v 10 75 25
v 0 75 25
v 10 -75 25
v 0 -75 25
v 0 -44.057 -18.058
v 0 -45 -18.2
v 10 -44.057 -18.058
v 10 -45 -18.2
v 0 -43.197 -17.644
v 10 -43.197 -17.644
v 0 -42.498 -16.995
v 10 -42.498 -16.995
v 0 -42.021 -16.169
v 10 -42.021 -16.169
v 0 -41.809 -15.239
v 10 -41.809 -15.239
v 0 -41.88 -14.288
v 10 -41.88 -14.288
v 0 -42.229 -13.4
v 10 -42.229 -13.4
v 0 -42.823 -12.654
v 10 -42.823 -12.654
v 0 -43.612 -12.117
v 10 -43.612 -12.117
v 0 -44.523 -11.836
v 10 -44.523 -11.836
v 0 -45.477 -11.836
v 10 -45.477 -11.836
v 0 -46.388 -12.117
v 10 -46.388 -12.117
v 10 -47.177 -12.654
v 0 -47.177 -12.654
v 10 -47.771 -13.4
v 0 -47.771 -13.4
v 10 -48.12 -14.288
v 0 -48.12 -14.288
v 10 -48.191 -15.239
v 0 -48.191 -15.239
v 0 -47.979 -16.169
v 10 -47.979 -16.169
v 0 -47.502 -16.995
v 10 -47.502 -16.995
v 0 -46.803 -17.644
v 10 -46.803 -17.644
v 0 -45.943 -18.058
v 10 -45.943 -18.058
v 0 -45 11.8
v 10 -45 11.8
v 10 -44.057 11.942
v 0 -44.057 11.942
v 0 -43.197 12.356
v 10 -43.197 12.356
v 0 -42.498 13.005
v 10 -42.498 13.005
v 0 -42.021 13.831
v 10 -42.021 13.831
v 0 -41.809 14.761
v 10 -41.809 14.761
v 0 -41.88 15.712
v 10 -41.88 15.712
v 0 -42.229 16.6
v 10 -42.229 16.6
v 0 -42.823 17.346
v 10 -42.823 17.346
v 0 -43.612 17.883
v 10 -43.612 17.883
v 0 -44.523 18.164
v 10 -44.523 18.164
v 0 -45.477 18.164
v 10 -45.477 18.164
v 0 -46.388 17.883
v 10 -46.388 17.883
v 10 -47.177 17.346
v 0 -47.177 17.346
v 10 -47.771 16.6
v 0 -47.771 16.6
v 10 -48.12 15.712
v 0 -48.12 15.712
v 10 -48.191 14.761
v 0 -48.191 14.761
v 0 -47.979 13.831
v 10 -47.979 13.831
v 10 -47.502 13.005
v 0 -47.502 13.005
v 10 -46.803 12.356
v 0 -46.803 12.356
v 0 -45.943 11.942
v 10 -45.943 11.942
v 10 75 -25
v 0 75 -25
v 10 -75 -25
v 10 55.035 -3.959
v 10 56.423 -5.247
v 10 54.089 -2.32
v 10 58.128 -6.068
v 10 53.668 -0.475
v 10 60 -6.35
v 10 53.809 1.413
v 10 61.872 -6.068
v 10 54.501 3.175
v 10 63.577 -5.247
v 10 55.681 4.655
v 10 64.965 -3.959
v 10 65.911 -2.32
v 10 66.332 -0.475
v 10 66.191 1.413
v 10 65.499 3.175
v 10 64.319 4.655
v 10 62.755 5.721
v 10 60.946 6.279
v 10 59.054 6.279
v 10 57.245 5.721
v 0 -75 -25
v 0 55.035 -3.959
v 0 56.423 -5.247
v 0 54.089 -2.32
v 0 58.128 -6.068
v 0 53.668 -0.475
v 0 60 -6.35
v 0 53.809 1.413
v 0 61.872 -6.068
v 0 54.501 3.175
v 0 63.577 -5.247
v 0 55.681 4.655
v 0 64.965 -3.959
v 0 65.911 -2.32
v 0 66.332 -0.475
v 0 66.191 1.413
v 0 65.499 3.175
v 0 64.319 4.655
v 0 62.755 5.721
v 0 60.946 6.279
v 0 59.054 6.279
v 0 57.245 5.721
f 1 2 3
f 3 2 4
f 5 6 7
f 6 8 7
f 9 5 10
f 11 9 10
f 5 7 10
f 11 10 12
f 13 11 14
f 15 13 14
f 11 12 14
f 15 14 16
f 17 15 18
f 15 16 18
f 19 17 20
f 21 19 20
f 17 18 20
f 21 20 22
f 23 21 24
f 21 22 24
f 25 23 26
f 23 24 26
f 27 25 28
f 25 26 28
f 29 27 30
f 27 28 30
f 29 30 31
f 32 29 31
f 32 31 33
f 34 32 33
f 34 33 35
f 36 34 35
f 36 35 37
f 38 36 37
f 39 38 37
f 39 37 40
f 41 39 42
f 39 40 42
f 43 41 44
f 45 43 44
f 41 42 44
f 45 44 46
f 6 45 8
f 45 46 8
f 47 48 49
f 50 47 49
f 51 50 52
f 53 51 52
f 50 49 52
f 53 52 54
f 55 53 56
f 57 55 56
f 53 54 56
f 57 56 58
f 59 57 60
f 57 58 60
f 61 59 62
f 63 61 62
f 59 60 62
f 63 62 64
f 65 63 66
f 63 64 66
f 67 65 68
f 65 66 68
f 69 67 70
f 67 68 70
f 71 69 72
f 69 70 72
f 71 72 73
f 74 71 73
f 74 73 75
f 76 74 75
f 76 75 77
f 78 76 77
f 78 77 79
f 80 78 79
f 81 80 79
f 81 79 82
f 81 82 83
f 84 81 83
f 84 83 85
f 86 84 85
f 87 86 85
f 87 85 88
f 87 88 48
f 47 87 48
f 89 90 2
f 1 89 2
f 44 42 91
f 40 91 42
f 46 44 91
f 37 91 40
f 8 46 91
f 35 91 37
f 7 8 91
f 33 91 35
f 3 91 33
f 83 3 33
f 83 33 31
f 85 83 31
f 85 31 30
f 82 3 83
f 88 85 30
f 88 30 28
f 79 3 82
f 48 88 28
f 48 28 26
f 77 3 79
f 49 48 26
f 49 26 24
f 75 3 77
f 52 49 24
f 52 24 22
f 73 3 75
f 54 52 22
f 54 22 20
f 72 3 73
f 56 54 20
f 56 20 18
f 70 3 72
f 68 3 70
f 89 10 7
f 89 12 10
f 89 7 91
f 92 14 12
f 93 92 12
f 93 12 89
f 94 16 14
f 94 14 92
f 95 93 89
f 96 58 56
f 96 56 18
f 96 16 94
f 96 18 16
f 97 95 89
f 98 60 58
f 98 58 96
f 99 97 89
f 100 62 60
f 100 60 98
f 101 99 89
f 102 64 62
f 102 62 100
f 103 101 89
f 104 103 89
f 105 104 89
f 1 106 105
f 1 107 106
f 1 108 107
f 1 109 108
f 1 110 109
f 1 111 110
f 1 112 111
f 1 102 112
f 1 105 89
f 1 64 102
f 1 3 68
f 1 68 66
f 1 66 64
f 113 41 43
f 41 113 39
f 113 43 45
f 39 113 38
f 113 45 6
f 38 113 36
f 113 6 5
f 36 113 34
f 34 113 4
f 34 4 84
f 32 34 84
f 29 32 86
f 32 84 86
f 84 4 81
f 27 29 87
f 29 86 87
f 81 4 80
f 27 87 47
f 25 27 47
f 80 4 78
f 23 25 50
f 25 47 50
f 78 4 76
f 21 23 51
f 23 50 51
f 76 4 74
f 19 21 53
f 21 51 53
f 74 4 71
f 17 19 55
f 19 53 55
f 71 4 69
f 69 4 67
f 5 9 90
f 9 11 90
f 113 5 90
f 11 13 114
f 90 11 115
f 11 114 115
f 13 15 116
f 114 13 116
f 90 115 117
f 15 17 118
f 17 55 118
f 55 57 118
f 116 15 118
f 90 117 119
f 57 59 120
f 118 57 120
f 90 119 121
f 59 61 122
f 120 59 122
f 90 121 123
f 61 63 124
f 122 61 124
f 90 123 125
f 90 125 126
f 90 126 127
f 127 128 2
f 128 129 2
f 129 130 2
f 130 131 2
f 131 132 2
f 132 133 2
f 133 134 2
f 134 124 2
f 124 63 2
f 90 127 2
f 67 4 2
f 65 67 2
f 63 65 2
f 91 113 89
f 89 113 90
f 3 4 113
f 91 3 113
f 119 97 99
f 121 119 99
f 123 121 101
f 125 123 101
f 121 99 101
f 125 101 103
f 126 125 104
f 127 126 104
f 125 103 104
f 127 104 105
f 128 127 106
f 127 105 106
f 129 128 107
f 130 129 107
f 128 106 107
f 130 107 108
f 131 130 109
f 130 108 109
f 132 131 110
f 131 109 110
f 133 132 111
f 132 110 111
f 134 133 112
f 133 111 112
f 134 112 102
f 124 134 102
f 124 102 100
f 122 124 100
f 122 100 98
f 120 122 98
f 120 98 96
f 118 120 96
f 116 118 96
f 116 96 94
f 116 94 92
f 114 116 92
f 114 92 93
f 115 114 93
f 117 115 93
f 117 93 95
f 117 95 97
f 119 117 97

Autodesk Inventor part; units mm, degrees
ref_plane "YZ Plane" through (0, 0, 0) normal (1, 0, 0) x (0, 1, 0)
ref_plane "XZ Plane" through (0, 0, 0) normal (0, 1, 0) x (-1, 0, 0)
ref_plane "XY Plane" through (0, 0, 0) normal (0, 0, 1) x (1, 0, 0)
sketch "Sketch2" plane through (0, 0, 0) normal (1, 0, 0) x (0, 1, 0)
  line L0 (75, 25) -> (-75, 25)
  line L1 (-75, 25) -> (-75, -25)
  line L2 (-75, -25) -> (75, -25)
  line L3 (75, -25) -> (75, 25)
  line L4 (75, 25) -> (-75, -25) construction
  line L5 (-75, 25) -> (75, -25) construction
  point P0 (0, 0)
  dimension "d4" = 150
  dimension "d5" = 50
extrude "Extrusion" add sketch "Sketch2" along normal blind 10
sketch "Sketch3" plane through (10, 0, 0) normal (1, 0, 0) x (0, 0, -1)
  circle A0 centre (-15, -45) radius 3.2
  circle A1 centre (15, -45) radius 3.2
  circle A2 centre (0, 60) radius 6.35
  point P0 (0, 0)
  dimension "d8" = 6.4
  dimension "d9" = 12.7
  dimension "d12" = 6.4
extrude "Extrusion2" cut sketch "Sketch3" against normal through all
properties part number "Stand"
